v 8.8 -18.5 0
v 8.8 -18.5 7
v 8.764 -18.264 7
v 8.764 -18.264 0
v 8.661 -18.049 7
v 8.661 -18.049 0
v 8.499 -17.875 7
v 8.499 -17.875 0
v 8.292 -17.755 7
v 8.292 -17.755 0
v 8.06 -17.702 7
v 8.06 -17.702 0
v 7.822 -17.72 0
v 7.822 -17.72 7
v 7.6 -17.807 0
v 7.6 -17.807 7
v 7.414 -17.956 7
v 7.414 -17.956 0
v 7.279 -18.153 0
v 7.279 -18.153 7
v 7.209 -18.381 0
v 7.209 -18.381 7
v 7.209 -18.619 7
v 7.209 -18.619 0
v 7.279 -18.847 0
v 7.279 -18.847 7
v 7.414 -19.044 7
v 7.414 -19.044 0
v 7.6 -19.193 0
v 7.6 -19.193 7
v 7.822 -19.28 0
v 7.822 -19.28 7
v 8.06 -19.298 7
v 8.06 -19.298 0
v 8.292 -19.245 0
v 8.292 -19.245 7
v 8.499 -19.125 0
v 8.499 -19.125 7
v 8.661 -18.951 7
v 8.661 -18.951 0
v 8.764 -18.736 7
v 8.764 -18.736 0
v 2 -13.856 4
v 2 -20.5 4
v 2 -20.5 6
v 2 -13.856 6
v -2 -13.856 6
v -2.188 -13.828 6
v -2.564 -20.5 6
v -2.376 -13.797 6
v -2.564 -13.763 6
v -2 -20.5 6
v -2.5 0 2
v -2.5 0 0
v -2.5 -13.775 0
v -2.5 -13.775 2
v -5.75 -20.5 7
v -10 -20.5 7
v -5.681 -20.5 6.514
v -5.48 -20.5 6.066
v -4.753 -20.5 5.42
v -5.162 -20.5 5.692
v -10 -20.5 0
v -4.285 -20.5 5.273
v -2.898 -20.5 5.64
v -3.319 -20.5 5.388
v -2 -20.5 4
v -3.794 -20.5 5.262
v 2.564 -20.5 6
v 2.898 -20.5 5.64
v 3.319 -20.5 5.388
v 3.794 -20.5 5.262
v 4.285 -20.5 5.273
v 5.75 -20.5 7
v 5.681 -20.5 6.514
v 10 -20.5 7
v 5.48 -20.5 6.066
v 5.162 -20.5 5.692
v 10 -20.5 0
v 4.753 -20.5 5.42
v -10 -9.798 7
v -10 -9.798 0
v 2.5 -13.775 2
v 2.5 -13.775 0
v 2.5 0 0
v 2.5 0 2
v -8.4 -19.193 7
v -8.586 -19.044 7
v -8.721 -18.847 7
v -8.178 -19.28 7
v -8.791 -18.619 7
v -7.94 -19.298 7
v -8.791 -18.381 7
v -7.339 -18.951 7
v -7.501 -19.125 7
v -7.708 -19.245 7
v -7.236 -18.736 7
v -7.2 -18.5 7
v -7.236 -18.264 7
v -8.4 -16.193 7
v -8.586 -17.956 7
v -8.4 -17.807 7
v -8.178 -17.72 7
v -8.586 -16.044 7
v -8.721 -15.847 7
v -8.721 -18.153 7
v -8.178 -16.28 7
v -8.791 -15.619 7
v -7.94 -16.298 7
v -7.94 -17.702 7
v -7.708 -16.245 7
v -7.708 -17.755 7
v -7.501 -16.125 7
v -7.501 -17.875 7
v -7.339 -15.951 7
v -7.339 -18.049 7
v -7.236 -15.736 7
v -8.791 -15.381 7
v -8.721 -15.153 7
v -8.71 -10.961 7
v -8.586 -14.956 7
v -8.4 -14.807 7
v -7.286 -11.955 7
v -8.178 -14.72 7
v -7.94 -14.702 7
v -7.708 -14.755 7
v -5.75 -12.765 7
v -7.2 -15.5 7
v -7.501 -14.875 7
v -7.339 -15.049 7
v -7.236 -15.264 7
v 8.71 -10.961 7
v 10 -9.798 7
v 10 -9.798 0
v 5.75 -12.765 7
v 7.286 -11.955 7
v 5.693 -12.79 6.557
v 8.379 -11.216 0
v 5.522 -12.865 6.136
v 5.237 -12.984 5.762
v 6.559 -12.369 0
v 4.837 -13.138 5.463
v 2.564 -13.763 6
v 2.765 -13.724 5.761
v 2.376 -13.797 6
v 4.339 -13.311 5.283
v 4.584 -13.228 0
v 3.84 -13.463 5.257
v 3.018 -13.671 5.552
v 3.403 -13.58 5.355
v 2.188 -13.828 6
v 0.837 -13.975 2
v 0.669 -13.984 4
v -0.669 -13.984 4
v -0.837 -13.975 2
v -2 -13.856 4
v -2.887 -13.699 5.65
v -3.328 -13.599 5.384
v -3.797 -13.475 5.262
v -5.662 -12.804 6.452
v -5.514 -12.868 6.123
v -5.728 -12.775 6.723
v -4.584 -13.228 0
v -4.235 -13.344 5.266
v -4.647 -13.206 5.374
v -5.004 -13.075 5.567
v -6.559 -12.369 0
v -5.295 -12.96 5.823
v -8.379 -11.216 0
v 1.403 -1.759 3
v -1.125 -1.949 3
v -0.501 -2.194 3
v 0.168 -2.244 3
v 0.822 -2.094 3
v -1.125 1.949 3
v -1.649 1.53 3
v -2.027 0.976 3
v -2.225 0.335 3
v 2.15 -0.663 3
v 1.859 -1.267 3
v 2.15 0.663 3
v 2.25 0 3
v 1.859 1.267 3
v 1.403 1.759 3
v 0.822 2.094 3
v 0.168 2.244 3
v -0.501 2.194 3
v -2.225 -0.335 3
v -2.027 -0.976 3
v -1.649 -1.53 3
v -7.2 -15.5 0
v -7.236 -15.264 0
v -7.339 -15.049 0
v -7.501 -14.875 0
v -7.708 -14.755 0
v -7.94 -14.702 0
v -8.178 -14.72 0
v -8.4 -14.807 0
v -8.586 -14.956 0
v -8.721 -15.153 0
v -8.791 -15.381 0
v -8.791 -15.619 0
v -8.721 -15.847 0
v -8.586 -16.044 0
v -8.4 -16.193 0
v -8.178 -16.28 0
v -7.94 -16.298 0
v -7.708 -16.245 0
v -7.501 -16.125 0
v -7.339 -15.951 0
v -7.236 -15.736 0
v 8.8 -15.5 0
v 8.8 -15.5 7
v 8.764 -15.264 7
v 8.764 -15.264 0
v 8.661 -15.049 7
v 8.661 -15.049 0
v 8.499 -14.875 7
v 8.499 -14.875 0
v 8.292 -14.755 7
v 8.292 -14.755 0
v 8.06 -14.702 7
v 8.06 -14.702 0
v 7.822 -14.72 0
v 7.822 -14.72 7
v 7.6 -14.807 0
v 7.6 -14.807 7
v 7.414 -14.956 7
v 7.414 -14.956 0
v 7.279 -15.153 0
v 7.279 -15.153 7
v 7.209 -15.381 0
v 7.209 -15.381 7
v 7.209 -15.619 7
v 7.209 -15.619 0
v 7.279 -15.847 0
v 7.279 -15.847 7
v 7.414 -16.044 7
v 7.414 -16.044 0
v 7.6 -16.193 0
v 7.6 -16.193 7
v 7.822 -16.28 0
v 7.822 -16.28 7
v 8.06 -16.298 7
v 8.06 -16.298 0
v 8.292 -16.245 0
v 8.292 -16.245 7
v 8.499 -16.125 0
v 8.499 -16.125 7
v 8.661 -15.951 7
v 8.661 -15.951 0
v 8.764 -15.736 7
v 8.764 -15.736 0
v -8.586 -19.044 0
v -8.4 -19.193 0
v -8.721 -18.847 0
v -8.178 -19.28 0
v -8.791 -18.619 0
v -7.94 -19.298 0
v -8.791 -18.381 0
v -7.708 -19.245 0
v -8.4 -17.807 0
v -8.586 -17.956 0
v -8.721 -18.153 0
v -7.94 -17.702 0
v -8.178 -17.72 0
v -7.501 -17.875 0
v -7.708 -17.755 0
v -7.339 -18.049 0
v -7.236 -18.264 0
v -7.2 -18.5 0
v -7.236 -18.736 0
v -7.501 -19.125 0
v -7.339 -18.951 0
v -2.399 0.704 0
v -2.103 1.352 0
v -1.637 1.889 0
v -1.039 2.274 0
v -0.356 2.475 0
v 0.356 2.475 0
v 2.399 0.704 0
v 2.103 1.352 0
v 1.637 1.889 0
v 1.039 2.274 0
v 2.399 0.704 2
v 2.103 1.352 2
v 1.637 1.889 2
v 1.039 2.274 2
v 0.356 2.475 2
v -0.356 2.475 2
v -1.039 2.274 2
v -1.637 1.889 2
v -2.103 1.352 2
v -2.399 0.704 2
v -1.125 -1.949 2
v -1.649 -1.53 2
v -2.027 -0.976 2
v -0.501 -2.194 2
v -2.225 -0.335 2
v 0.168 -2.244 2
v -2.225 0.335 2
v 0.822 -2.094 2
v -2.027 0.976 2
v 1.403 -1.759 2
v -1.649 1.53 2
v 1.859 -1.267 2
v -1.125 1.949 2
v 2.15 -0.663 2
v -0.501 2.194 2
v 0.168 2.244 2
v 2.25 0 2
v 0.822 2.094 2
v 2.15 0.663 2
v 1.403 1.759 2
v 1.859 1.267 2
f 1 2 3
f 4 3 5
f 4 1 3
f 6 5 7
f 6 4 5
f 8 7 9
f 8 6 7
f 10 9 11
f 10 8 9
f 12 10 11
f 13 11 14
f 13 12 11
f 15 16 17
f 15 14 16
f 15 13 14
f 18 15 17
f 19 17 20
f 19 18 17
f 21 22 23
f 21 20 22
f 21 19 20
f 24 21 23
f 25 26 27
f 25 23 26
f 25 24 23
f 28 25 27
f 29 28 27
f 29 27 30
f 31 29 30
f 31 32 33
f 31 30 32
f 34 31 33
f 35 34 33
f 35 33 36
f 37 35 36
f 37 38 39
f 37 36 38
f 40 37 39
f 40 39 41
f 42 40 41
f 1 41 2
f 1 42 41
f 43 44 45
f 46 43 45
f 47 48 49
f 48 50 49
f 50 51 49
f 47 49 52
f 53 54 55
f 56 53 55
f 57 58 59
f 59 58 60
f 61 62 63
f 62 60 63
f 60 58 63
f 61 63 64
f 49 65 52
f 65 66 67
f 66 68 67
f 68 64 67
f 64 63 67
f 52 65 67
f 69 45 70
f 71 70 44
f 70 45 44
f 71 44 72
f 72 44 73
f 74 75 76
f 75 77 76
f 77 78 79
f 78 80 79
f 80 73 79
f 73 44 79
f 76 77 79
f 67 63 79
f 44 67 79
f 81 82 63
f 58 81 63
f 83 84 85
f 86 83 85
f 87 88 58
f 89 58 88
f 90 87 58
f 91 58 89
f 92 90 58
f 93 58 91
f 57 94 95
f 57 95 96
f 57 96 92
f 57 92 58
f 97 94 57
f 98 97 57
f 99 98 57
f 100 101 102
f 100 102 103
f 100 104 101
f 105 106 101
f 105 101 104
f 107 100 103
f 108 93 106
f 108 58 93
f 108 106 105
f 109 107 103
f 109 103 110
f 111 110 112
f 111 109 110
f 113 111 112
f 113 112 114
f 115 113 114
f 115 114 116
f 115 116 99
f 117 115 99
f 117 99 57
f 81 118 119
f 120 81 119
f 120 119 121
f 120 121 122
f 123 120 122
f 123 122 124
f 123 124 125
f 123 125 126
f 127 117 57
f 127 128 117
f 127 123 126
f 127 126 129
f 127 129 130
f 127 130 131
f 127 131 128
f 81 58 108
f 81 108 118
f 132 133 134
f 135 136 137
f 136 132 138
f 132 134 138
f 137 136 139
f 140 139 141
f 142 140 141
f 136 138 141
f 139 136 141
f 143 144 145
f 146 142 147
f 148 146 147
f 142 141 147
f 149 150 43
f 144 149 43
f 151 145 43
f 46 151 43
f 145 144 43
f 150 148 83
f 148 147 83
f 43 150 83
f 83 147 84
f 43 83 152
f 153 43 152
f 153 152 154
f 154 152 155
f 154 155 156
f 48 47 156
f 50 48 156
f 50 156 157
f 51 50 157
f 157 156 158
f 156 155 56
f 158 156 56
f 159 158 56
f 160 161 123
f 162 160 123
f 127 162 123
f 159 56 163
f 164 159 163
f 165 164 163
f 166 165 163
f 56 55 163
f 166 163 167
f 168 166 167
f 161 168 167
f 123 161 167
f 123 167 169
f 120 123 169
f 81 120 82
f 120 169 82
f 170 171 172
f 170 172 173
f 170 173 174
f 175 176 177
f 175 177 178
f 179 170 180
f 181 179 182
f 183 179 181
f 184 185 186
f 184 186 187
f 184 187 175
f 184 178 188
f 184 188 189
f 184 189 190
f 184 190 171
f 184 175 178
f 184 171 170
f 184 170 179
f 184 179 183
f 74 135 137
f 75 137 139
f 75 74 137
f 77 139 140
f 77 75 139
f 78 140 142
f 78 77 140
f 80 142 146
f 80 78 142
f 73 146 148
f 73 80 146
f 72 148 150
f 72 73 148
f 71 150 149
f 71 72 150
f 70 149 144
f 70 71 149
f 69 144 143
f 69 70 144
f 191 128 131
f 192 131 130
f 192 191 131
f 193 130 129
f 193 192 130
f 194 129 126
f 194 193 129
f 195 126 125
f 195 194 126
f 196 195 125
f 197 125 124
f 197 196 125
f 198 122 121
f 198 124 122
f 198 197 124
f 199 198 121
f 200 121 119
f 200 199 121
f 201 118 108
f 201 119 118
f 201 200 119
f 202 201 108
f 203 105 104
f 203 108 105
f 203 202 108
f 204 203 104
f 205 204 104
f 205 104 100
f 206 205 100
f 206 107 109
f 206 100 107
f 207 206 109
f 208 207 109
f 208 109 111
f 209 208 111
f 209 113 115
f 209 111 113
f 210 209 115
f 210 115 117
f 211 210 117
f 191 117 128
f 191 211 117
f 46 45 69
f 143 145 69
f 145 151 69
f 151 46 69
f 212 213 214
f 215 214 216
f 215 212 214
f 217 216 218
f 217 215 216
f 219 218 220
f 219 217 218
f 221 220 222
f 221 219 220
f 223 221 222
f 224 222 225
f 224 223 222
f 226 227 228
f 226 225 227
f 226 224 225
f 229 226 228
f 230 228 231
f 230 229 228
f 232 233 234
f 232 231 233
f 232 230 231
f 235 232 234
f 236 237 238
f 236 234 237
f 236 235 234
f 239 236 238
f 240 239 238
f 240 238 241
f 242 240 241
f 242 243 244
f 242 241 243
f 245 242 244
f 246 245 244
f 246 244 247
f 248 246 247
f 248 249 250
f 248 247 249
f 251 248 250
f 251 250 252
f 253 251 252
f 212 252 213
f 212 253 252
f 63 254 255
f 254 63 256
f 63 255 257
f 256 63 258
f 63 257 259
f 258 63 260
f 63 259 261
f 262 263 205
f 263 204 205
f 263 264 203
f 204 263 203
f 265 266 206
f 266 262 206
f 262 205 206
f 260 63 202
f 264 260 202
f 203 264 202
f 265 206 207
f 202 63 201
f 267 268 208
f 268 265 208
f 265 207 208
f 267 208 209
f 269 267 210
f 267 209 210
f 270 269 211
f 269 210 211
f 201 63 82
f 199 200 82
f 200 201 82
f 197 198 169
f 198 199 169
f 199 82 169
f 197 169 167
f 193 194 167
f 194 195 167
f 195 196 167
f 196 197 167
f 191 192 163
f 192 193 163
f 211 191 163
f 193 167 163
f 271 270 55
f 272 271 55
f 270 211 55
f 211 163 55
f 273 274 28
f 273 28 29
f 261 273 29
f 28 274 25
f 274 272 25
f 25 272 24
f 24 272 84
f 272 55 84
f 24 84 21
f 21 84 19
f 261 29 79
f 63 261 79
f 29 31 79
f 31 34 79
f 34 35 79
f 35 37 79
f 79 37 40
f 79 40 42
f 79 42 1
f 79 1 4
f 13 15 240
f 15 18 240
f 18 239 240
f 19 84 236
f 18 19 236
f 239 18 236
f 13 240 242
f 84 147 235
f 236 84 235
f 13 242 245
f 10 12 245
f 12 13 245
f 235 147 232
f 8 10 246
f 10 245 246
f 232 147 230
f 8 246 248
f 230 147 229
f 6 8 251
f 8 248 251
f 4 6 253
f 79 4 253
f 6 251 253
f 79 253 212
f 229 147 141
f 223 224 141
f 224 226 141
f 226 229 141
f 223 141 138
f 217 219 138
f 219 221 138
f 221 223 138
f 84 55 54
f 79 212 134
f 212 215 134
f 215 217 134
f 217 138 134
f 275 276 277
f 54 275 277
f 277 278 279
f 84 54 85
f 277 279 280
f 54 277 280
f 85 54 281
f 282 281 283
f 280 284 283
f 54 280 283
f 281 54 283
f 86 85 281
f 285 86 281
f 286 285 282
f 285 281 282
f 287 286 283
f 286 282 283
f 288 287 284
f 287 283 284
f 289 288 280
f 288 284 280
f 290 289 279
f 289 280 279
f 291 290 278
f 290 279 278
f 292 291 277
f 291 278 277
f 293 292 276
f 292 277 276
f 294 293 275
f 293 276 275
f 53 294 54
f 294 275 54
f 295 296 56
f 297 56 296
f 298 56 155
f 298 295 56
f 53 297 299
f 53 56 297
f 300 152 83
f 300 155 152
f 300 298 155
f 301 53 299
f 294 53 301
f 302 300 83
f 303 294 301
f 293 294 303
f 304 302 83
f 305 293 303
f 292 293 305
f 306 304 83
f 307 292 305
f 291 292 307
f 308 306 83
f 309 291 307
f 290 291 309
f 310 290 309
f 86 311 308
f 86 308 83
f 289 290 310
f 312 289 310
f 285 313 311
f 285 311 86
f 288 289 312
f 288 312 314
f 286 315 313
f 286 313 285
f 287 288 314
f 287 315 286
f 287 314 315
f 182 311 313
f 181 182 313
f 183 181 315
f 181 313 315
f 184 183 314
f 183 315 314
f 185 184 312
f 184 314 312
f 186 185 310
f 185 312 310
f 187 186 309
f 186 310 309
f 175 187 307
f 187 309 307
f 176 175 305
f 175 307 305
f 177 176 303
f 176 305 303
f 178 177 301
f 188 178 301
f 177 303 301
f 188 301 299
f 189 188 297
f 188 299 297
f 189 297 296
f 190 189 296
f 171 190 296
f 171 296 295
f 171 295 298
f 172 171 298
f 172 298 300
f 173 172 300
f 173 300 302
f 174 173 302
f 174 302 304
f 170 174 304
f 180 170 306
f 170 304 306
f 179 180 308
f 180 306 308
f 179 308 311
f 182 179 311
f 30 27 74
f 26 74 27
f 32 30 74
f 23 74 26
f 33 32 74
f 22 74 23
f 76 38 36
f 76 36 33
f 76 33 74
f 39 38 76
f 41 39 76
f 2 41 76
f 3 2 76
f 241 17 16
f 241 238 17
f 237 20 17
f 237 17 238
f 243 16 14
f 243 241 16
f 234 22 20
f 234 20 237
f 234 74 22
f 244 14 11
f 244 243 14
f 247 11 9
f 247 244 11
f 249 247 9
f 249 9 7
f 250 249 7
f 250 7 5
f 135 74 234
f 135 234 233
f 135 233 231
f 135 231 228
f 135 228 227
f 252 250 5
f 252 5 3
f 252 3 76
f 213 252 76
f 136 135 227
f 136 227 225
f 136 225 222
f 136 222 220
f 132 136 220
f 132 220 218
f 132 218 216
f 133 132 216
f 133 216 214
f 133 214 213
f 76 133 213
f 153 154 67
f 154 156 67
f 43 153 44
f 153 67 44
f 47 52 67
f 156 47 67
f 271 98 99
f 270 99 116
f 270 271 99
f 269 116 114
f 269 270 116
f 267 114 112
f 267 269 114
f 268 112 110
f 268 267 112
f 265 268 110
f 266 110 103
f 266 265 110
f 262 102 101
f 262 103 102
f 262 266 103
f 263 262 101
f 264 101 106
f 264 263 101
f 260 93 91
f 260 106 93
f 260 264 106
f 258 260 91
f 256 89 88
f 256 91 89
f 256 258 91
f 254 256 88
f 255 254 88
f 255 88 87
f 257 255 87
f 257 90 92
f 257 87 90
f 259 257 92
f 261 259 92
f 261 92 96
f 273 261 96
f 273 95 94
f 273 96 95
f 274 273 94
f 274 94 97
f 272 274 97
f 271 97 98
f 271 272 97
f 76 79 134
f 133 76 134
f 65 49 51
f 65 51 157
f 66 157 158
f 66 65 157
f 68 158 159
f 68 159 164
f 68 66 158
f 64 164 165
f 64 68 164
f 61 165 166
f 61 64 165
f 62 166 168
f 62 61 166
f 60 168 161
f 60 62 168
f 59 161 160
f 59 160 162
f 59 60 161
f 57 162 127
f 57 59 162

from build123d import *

# Parameters (mm, degrees)
BOSS_EXTRUDE1_DEPTH = 7
BOSS_EXTRUDE2_DEPTH = 2
BOSS_EXTRUDE3_START = 2
SKETCH3_R           = 2.25
BOSS_EXTRUDE3_DEPTH = 1
SKETCH4_R           = 0.8
SCREW_HOLES_DEPTH   = 8
CABLE_START         = -20.5
SKETCH6_R           = 1.75
CABLE_TUBES_DEPTH   = 18.5
WIRE_START          = -20.5
WIRE_CANALS_DEPTH   = 7.5


with BuildPart() as part:
    # Sketch1 → Boss-Extrude1 (new body)
    with BuildSketch(Plane.XY):
        with BuildLine():
            ThreePointArc((10, -9.797958971), (0, -14), (-10, -9.797958971))
            Line((-10, -9.797958971), (-10, -20.5))
            Line((-10, -20.5), (10, -20.5))
            Line((10, -20.5), (10, -9.797958971))
        make_face()
    extrude(amount=BOSS_EXTRUDE1_DEPTH)

    # Sketch2 → Boss-Extrude2 (add)
    with BuildSketch(Plane.XY):
        with BuildLine():
            Line((-2.5, 0), (-2.5, -20.5))
            Line((-2.5, -20.5), (2.5, -20.5))
            Line((2.5, -20.5), (2.5, 0))
            ThreePointArc((2.5, 0), (0, 2.5), (-2.5, 0))
        make_face()
    extrude(amount=BOSS_EXTRUDE2_DEPTH)

    # Sketch3 → Boss-Extrude3 (add)
    with BuildSketch(Plane.XY.offset(BOSS_EXTRUDE3_START)):
        Circle(SKETCH3_R)
    extrude(amount=BOSS_EXTRUDE3_DEPTH)

    # Sketch4 → Screw Holes (cut, through all)
    with BuildSketch(Plane.XY):
        with Locations((-8, -15.5)):
            Circle(SKETCH4_R)
        with Locations((8, -15.5)):
            Circle(SKETCH4_R)
        with Locations((-8, -18.5)):
            Circle(SKETCH4_R)
        with Locations((8, -18.5)):
            Circle(SKETCH4_R)
    extrude(amount=SCREW_HOLES_DEPTH, mode=Mode.SUBTRACT)

    # Sketch6 → Cable Tubes (cut)
    with BuildSketch(Plane(origin=(0, 0, 0), x_dir=(1, 0, 0), z_dir=(0, 1, 0)).offset(CABLE_START)):
        with Locations((-4, -7)):
            Circle(SKETCH6_R)
        with Locations((4, -7)):
            Circle(SKETCH6_R)
    extrude(amount=CABLE_TUBES_DEPTH, mode=Mode.SUBTRACT)

    # Sketch7 → Wire Canals (cut)
    with BuildSketch(Plane(origin=(0, 0, 0), x_dir=(1, 0, 0), z_dir=(0, 1, 0)).offset(WIRE_START)):
        Polygon((-3, -6), (-2, -6), (-2, -4), (2, -4), (2, -6), (3, -6), (3, -7), (-3, -7), align=None)
    extrude(amount=WIRE_CANALS_DEPTH, mode=Mode.SUBTRACT)


solid = part.part
